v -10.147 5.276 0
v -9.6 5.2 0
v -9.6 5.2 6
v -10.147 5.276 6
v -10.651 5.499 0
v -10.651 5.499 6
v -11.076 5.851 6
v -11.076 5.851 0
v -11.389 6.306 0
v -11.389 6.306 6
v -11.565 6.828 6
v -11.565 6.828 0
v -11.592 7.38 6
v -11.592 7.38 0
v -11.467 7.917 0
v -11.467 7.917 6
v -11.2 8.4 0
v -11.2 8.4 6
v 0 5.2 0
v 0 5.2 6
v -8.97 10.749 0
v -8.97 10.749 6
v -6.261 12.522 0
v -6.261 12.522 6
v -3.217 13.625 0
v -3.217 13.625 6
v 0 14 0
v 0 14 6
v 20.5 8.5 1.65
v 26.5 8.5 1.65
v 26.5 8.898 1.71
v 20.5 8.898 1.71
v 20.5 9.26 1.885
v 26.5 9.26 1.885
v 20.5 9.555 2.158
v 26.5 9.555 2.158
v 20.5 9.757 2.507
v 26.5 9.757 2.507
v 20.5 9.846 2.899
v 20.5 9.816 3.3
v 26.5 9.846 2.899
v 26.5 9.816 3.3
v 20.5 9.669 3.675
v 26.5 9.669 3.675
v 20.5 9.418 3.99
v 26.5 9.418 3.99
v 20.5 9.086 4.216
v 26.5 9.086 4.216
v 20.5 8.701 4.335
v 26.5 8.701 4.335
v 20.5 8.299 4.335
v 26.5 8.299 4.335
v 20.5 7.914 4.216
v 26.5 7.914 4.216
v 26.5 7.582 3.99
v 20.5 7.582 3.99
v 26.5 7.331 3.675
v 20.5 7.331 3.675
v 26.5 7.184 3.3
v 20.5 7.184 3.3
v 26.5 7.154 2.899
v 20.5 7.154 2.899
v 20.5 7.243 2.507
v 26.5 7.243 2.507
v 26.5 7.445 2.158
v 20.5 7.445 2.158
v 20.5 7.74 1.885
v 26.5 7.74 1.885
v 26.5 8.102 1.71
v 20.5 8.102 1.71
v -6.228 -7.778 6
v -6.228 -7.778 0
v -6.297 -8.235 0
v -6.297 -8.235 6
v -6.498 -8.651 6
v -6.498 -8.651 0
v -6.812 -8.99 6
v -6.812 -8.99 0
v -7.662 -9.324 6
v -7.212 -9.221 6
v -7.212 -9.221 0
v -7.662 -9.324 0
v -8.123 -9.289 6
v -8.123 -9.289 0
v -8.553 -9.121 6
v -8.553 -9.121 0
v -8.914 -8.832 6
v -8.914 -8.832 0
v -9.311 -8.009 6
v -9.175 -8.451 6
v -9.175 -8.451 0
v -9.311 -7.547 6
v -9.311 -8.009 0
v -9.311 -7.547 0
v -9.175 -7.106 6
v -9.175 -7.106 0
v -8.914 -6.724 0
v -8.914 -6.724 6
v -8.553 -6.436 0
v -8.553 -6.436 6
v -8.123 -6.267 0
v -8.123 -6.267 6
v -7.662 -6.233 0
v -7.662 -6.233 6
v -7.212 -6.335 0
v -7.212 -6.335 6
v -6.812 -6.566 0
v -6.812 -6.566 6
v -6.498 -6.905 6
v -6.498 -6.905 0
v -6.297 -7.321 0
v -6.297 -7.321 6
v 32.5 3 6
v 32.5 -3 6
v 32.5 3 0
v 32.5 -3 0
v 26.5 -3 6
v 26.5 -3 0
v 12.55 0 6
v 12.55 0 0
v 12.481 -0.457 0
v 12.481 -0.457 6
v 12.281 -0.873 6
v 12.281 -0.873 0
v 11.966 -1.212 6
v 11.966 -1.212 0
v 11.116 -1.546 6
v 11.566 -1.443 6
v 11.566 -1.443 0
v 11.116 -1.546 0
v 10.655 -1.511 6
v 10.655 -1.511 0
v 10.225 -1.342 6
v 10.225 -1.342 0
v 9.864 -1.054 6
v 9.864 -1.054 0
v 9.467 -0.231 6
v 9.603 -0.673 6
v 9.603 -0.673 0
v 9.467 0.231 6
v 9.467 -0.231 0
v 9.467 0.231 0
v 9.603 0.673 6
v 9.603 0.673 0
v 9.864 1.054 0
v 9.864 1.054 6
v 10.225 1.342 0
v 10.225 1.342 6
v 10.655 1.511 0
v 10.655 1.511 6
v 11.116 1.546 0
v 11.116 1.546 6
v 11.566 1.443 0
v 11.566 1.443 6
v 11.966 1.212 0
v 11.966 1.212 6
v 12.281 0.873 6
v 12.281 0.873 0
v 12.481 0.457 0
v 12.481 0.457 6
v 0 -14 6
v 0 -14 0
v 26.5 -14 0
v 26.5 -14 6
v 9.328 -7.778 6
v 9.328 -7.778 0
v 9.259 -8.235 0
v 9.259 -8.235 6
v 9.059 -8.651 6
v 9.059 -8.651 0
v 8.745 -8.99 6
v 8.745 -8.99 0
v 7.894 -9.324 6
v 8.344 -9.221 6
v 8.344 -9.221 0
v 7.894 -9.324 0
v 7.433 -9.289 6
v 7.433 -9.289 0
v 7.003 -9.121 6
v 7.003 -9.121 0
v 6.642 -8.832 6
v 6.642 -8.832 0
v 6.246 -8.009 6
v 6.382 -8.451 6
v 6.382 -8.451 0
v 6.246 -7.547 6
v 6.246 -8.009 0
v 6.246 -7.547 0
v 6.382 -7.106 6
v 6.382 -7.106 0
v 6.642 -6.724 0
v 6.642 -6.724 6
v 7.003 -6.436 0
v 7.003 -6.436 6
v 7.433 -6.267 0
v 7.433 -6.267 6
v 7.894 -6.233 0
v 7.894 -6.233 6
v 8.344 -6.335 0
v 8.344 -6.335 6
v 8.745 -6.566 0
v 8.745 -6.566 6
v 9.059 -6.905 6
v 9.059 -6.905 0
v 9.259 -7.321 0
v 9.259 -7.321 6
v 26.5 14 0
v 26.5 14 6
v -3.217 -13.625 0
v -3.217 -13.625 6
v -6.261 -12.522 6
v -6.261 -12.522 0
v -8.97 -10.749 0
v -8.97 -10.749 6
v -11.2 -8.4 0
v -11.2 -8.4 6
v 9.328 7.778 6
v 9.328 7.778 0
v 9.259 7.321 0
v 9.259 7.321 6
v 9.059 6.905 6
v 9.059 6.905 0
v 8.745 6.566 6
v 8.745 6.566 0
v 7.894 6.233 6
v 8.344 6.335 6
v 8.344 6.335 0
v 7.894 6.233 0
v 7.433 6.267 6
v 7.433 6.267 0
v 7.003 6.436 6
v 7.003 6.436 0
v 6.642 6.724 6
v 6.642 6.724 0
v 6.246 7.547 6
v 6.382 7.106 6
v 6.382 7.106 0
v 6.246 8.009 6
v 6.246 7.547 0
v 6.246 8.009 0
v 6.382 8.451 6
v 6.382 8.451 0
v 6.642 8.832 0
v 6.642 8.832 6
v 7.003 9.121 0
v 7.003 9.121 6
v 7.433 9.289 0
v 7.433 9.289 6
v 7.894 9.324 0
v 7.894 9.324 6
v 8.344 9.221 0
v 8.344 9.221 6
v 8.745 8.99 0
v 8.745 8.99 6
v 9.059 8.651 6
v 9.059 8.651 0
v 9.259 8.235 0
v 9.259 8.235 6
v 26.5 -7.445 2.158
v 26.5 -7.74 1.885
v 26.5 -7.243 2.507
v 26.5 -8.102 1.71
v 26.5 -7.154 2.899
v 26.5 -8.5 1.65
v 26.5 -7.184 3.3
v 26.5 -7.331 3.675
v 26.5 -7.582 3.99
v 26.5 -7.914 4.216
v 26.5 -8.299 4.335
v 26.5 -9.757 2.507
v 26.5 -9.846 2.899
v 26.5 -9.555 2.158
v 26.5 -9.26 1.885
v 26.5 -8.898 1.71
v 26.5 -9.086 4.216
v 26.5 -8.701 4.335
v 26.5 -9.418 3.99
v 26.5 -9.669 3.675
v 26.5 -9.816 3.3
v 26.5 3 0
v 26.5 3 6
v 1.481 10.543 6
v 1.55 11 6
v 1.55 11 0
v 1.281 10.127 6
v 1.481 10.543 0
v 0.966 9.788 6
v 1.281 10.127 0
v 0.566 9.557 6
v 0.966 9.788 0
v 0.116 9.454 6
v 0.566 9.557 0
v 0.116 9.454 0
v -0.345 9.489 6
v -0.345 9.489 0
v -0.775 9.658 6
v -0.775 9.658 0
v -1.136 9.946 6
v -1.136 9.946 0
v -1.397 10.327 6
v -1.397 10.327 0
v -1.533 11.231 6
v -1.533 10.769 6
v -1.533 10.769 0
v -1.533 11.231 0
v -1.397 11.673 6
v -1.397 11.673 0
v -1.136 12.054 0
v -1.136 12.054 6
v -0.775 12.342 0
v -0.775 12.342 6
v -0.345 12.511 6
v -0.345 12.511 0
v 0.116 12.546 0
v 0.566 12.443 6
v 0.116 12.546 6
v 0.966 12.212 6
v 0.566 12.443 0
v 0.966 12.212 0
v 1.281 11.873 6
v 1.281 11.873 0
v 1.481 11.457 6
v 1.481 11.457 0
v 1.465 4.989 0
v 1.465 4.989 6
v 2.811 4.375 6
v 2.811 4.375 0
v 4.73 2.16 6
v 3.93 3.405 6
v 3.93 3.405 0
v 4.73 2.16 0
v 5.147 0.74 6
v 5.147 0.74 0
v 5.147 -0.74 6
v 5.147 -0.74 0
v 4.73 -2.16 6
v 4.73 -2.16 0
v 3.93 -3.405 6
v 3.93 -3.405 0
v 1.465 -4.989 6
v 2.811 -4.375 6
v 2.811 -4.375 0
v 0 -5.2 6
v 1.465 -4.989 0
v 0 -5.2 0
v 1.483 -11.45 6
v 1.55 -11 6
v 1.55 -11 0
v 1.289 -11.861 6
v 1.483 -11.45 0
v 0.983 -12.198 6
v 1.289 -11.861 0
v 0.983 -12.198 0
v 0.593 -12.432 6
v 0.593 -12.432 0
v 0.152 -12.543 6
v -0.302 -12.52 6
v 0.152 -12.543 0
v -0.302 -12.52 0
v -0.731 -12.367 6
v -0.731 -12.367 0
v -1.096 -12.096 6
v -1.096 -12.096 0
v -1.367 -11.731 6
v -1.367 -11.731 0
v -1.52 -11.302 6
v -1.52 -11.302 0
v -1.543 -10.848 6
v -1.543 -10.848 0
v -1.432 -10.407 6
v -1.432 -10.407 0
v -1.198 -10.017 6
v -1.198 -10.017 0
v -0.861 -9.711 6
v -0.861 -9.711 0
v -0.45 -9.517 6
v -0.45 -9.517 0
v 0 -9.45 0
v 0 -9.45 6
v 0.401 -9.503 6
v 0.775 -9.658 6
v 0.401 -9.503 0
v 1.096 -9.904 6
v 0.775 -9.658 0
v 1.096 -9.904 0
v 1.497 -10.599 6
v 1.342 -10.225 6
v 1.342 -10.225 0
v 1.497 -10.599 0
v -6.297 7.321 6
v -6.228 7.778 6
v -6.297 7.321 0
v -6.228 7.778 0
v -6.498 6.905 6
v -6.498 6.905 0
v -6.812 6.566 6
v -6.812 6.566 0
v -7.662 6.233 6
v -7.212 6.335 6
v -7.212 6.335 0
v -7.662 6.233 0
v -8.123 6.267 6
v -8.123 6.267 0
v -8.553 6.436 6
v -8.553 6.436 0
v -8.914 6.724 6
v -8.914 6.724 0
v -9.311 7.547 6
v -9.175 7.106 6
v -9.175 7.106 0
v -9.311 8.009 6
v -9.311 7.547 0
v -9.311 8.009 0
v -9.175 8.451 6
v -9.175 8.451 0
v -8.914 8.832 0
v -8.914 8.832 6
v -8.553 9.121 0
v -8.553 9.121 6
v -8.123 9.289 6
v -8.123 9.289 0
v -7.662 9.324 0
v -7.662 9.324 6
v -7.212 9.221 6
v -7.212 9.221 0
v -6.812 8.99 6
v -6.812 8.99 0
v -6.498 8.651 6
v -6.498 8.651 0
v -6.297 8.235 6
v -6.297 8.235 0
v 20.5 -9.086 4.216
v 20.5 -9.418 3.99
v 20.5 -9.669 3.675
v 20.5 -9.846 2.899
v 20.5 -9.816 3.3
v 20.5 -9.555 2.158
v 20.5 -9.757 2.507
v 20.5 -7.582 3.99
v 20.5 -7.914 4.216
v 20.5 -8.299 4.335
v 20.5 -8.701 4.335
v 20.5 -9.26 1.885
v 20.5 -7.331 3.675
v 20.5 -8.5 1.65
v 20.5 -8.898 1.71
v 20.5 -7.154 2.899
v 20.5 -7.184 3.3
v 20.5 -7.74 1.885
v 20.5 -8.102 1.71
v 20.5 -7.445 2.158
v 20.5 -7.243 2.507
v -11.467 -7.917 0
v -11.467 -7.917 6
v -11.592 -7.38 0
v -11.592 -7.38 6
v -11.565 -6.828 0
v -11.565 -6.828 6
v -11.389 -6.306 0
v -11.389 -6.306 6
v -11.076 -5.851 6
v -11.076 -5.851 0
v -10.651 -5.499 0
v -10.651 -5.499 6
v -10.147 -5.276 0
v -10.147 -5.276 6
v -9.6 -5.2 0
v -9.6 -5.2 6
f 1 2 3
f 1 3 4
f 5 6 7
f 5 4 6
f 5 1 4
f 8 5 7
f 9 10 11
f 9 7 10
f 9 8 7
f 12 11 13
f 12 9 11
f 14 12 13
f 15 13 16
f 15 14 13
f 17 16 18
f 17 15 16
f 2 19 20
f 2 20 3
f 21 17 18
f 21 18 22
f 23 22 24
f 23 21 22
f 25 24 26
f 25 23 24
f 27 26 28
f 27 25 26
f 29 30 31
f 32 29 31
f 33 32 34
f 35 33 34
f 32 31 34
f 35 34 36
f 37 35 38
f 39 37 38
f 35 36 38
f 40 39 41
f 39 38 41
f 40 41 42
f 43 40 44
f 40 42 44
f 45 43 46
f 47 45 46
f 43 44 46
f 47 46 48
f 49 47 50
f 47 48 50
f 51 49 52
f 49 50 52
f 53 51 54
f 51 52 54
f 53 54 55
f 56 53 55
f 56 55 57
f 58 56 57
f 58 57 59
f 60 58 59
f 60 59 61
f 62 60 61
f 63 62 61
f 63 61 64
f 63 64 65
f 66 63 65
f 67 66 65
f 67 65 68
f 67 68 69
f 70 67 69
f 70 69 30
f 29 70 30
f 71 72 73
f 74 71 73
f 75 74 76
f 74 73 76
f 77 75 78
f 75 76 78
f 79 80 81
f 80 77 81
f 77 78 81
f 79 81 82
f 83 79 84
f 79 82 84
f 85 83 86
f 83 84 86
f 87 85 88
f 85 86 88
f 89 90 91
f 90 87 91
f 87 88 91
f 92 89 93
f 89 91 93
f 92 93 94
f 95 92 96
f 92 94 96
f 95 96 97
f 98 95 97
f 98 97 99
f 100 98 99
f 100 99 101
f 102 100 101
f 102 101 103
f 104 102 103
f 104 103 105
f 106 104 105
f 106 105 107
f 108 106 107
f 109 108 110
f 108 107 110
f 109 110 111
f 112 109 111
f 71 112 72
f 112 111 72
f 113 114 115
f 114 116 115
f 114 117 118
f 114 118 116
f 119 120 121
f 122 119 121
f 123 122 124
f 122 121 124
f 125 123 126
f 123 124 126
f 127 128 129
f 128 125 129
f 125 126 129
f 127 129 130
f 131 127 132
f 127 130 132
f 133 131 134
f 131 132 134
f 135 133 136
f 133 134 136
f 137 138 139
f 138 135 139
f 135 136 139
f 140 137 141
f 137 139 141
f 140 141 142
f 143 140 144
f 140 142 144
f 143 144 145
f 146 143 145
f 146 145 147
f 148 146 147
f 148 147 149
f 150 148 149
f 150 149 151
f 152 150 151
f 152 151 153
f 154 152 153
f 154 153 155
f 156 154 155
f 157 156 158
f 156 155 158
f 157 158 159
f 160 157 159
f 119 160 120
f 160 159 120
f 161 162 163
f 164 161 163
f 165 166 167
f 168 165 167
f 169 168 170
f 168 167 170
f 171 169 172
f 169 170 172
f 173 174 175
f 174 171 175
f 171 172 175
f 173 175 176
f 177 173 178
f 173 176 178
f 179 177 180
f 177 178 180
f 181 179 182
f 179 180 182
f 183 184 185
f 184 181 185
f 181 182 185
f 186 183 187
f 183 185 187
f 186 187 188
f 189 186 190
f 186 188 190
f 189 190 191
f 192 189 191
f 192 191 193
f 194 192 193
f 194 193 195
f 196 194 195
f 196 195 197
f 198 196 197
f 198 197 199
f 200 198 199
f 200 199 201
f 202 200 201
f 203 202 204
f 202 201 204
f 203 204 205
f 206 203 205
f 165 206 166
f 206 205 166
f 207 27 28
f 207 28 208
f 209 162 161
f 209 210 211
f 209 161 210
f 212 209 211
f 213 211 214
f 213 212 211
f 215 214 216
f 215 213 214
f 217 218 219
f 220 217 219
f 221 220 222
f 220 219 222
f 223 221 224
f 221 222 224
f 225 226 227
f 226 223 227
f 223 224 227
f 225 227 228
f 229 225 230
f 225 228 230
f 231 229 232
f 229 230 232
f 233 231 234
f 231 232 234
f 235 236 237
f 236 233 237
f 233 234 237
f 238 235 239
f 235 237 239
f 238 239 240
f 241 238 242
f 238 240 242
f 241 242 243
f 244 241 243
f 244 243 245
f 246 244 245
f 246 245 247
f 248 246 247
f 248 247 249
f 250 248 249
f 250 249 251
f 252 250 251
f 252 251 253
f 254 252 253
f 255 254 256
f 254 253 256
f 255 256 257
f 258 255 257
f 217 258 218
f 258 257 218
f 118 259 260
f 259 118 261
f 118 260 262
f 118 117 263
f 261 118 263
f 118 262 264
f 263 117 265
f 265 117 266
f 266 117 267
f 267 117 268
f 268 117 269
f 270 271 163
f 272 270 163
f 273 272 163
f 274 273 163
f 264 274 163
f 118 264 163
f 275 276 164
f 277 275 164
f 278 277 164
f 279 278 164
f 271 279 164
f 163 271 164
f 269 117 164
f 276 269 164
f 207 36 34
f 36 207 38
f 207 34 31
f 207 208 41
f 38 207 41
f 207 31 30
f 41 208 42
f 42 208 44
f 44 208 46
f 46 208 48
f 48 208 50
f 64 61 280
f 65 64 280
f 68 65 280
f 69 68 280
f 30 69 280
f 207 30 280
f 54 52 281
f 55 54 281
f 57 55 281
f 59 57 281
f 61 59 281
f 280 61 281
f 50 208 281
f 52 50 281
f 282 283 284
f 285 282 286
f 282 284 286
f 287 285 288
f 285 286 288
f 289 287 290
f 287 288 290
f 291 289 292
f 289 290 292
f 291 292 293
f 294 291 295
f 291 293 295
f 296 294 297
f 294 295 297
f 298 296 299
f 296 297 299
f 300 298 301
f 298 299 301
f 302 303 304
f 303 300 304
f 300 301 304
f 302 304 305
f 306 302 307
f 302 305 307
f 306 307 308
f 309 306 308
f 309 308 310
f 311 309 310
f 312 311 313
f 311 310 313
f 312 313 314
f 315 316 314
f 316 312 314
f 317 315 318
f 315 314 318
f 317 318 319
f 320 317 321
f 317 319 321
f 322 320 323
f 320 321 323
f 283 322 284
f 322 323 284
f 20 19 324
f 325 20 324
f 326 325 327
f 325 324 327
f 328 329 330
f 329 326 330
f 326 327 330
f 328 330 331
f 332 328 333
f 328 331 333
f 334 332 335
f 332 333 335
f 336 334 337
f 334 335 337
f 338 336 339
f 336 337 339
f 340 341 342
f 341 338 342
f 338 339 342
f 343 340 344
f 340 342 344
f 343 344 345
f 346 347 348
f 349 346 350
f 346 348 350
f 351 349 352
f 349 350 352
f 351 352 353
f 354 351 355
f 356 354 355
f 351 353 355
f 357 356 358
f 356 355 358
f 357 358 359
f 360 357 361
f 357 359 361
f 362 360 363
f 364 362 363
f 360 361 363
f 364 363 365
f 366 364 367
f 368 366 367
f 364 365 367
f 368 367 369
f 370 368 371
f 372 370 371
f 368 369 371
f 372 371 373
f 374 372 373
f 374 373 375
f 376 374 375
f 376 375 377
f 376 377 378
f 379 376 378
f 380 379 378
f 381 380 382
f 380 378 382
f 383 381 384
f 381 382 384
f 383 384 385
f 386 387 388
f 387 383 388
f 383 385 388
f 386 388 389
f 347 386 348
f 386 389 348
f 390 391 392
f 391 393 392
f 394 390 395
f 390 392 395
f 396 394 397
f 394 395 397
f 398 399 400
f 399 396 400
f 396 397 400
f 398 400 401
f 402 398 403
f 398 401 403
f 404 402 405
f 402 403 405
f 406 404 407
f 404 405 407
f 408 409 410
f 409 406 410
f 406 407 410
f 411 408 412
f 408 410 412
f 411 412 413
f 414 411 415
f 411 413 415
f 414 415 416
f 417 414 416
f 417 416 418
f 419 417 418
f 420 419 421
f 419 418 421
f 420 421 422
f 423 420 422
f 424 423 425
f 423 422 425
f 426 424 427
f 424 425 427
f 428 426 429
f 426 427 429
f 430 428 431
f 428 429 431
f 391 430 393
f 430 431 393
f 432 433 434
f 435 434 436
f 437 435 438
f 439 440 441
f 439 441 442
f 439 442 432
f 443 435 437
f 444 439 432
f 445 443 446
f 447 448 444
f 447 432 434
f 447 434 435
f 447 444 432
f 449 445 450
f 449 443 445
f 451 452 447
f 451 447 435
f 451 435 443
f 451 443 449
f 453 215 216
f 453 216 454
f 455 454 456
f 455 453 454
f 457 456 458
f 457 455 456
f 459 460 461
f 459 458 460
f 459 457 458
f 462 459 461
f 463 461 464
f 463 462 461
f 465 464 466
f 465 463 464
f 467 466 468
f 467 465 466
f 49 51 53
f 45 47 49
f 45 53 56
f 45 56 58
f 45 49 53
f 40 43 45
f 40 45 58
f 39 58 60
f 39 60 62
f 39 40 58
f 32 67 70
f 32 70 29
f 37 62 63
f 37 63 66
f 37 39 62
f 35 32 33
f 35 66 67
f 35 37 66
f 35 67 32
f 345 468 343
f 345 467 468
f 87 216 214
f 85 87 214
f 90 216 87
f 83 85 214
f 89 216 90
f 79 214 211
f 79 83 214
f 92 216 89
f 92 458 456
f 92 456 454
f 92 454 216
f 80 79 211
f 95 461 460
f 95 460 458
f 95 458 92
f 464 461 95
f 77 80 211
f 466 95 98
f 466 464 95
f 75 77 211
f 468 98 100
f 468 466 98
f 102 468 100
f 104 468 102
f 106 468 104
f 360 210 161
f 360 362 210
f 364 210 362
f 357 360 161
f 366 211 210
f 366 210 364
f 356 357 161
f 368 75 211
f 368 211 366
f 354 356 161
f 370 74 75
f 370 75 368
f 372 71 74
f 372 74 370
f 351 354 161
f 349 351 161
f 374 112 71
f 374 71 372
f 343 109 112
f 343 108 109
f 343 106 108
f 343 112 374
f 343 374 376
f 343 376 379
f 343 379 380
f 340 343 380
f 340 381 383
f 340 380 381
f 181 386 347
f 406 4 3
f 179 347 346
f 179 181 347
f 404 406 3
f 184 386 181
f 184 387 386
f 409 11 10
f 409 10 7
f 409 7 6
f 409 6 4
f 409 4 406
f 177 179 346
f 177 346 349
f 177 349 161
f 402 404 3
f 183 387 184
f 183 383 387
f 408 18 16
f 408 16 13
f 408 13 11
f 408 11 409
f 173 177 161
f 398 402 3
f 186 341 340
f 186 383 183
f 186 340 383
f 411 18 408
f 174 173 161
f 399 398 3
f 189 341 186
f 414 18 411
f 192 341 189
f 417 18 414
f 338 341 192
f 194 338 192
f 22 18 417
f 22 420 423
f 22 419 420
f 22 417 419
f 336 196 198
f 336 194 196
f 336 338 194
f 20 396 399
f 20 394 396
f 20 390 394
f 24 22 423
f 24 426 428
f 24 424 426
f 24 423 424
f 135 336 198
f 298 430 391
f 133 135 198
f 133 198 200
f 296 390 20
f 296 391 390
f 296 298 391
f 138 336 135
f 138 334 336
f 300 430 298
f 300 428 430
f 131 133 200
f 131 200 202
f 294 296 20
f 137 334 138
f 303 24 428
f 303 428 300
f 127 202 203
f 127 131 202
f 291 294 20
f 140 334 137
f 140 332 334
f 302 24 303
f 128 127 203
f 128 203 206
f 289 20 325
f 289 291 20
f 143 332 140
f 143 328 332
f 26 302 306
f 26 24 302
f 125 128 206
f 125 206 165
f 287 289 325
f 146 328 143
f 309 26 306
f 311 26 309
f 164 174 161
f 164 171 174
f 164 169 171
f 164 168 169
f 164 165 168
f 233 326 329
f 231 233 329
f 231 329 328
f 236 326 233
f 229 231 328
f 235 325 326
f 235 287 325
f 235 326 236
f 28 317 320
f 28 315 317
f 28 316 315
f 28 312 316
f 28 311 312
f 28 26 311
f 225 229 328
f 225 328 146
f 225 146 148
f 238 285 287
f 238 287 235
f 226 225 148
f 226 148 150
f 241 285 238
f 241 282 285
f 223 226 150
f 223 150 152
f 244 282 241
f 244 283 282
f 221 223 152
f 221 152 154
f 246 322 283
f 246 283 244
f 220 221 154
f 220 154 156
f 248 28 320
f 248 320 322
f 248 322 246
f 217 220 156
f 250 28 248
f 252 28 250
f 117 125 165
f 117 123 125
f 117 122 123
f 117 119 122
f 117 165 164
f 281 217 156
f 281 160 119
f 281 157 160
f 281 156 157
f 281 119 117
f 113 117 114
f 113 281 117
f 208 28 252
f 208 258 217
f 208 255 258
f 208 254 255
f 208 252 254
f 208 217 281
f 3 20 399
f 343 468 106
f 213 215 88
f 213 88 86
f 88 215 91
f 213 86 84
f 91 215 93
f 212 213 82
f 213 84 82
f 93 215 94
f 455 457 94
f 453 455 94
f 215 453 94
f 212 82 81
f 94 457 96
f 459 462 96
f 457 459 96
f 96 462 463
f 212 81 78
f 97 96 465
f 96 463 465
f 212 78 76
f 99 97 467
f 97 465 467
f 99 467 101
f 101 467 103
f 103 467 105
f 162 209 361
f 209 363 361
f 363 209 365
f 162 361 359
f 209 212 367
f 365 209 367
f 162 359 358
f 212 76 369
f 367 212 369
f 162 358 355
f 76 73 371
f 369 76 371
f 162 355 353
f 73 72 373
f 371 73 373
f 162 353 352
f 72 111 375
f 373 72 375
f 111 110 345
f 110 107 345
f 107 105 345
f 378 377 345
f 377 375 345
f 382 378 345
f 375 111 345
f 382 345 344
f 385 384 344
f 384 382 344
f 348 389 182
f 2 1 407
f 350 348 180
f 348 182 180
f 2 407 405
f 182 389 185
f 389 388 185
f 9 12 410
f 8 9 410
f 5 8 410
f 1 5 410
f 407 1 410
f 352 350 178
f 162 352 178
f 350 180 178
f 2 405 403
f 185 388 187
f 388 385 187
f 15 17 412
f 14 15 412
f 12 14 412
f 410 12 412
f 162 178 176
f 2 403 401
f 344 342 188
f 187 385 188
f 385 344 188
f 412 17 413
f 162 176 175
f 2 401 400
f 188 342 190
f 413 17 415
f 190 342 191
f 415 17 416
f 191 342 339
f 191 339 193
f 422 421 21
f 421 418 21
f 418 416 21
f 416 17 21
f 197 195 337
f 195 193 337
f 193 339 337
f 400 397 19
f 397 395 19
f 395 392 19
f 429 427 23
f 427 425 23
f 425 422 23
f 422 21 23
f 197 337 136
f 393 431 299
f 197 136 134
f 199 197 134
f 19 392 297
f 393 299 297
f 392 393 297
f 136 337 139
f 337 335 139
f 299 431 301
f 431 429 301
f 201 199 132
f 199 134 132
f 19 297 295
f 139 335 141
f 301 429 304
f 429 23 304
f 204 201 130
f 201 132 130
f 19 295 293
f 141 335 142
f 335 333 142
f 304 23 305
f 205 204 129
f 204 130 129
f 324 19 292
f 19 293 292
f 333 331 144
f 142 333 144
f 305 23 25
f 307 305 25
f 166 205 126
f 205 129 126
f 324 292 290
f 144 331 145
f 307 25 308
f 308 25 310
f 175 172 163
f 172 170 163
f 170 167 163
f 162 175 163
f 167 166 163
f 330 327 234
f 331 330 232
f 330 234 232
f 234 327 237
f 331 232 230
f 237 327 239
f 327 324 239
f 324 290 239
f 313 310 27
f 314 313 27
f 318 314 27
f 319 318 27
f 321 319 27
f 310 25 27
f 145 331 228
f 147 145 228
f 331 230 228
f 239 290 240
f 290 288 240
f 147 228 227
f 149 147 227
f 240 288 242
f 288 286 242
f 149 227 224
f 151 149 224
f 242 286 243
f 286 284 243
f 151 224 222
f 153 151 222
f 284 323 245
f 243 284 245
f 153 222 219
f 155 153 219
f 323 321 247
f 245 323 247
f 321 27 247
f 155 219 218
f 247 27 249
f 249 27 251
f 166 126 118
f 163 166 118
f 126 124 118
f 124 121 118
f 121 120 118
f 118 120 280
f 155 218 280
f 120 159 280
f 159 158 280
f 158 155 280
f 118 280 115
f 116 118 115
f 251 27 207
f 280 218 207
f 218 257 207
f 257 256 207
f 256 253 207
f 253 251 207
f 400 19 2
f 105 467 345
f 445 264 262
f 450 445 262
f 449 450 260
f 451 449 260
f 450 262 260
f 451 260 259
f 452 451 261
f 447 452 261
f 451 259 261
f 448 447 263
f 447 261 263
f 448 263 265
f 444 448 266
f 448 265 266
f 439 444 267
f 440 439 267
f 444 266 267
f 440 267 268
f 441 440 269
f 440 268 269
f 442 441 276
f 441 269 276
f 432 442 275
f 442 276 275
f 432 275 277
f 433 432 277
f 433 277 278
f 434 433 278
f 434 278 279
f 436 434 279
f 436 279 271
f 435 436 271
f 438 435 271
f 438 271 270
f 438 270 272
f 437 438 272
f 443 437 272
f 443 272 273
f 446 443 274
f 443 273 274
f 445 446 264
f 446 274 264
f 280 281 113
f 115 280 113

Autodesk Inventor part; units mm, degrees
ref_plane "YZ Plane" through (0, 0, 0) normal (1, 0, 0) x (0, 1, 0)
ref_plane "XZ Plane" through (0, 0, 0) normal (0, 1, 0) x (-1, 0, 0)
ref_plane "XY Plane" through (0, 0, 0) normal (0, 0, 1) x (1, 0, 0)
sketch "스케치1" plane through (0, 0, 0) normal (0, 0, 1) x (1, 0, 0)
  circle A0 centre (-7.7782, -7.7782) radius 1.55 projected
  circle A1 centre (7.7782, -7.7782) radius 1.55 projected
  circle A2 centre (7.7782, 7.7782) radius 1.55 projected
  circle A3 centre (-7.7782, 7.7782) radius 1.55 projected
  circle A4 centre (0, 11) radius 1.55 projected
  circle A5 centre (11, 0) radius 1.55 projected
  circle A6 centre (0, -11) radius 1.55 projected
  circle A7 centre (-11, 0) radius 1.55 projected
  circle A8 centre (0, 0) radius 14 projected
  arc A9 (0, -5.2) -> (0, 5.2) centre (0, 0) ccw
  line L0 (32.5, -23) -> (32.5001, 127) projected
  line L1 (26.5, -23) -> (32.5, -23) projected
  line L2 (26.5001, 127) -> (26.5, -23) projected
  line L3 (32.5001, 127) -> (26.5001, 127) projected
  line L4 (0, 14) -> (32.5, 14)
  line L5 (32.5, 14) -> (32.5, -12.55)
  line L6 (0, -12.55) -> (0, 14)
  line L7 (0, -14) -> (32.5, -14)
  line L8 (32.5, -14) -> (32.5, -12.55)
  line L9 (0, 5.2) -> (-9.6, 5.2)
  line L10 (-9.6, -5.2) -> (0, -5.2)
  line L11 (0, -5.2) -> (0, 5.2)
  arc A10 (-11.2, -8.4) -> (-11.2, 8.4) centre (0, 0) ccw
  arc A11 (-11.2, 8.4) -> (-9.6, 5.2) centre (-9.6, 7.2) ccw
  arc A12 (-9.6, -5.2) -> (-11.2, -8.4) centre (-9.6, -7.2) ccw
  line L12 (26.5, 0) -> (32.5, 0)
  line L13 (32.5, 0) -> (32.5, -3)
  line L14 (32.5, -3) -> (26.5, -3)
  line L15 (26.5, -3) -> (26.5, 0)
  line L16 (32.5, 0) -> (26.5, 0)
  line L17 (26.5, 0) -> (26.5, 3)
  line L18 (26.5, 3) -> (32.5, 3)
  line L19 (32.5, 3) -> (32.5, 0)
  point P0 (0, 0)
  point P1 (-12.9985, -5.2)
  point P2 (-12.9985, 5.2)
  point P3 (-11.2, 8.4)
  dimension "d1" = 2
  dimension "d4" = 3
  dimension "d5" = 3
extrude "돌출1" add sketch "스케치1" along normal blind 6 contours A4 L6 A8 A12 L10 A9 | A4 L6 L9 A11 A8 | L4 L2 L7 A8 | L4 L0 L18 L2 | L18 L0 L12 L2 | L2 L14 L0 L7 | L12 L0 L14 L2
sketch "스케치2" plane through (0, 0, 6) normal (0, 0, 1) x (1, 0, 0)
  arc A0 (-9.6, -5.2) -> (-11.2, -8.4) centre (-9.6, -7.2) ccw projected
  arc A1 (-11.2, -8.4) -> (0, -14) centre (0, 0) ccw projected
  line L0 (0, -14) -> (32.5, -14) projected
  line L1 (32.5, -14) -> (32.5, 14) projected
  line L2 (32.5, 14) -> (0, 14) projected
  arc A2 (0, 14) -> (-11.2, 8.4) centre (0, 0) ccw projected
  arc A3 (-11.2, 8.4) -> (-9.6, 5.2) centre (-9.6, 7.2) ccw projected
  line L3 (-9.6, 5.2) -> (0, 5.2) projected
  arc A4 (0, -5.2) -> (0, 5.2) centre (0, 0) ccw projected
  line L4 (0, -5.2) -> (-9.6, -5.2) projected
  circle A5 centre (0, -11) radius 1.55 projected
  circle A6 centre (-7.7782, 7.7782) radius 1.55 projected
  circle A7 centre (-7.7782, -7.7782) radius 1.55 projected
  circle A8 centre (7.7782, -7.7782) radius 1.55 projected
  circle A9 centre (7.7782, 7.7782) radius 1.55 projected
  circle A10 centre (11, 0) radius 1.55 projected
  circle A11 centre (0, 11) radius 1.55 projected
  line L5 (32.5, 14) -> (26.5, 14)
  line L6 (26.5, 14) -> (26.5, -14)
  line L7 (26.5, -14) -> (32.5, -14)
  line L8 (32.5, -14) -> (32.5, 14)
  line L9 (32.5, -14) -> (32.5, 14) projected
  line L10 (32.5, 0) -> (26.5, 0)
  line L11 (26.5, 0) -> (26.5, -3)
  line L12 (26.5, -3) -> (32.5, -3)
  line L13 (32.5, -3) -> (32.5, 0)
  line L14 (32.5, 0) -> (26.5, 0)
  line L15 (26.5, 0) -> (26.5, 3)
  line L16 (26.5, 3) -> (32.5, 3)
  line L17 (32.5, 3) -> (32.5, 0)
  point P0 (0, 0)
  point P1 (32.5, -3)
  dimension "d6" = 6
  dimension "d7" = 3
  dimension "d8" = 3
extrude "돌출2" cut sketch "스케치2" against normal blind 6 contours L6 L12 L1 L0 | L6 L2 L1 L16
sketch "스케치3" plane through (32.5, 52, -3.7) normal (1, 0, 0) x (0, -1, 0)
  point P0 (52, -3.7)
sketch "스케치4" plane through (26.5, -14, 6) normal (1, 0, 0) x (0, 0, -1)
  circle A0 centre (3, 5.5) radius 1.35 projected
  circle A1 centre (3, 22.5) radius 1.35 projected
  circle A2 centre (66.3, 80.5) radius 1.3 projected
  circle A3 centre (66.3, 51.5) radius 1.3 projected
  circle A4 centre (66.3, 118) radius 1.35 projected
  circle A5 centre (66.3, 14) radius 1.35 projected
  arc A6 (62.1, 141) -> (63.1, 140) centre (63.1, 141) ccw projected
  line L0 (62.1, 141) -> (-10.1, 141) projected
  line L1 (-10.1, 141) -> (-10.1, -9) projected
  line L2 (-10.1, -9) -> (62.1, -9) projected
  arc A7 (63.1, -8) -> (62.1, -9) centre (63.1, -9) ccw projected
  line L3 (63.1, -8) -> (63.1, -3.8) projected
  arc A8 (64.1, -2.8) -> (63.1, -3.8) centre (63.1, -2.8) ccw projected
  line L4 (64.1, -2.8) -> (68.3, -2.8) projected
  arc A9 (69.3, -1.8) -> (68.3, -2.8) centre (69.3, -2.8) ccw projected
  line L5 (69.3, -1.8) -> (69.3, 29.8) projected
  arc A10 (68.3, 30.8) -> (69.3, 29.8) centre (69.3, 30.8) ccw projected
  line L6 (68.3, 30.8) -> (64.1, 30.8) projected
  arc A11 (63.1, 31.8) -> (64.1, 30.8) centre (63.1, 30.8) ccw projected
  line L7 (63.1, 31.8) -> (63.1, 36.2) projected
  arc A12 (64.1, 37.2) -> (63.1, 36.2) centre (63.1, 37.2) ccw projected
  line L8 (64.1, 37.2) -> (68.3, 37.2) projected
  arc A13 (69.3, 38.2) -> (68.3, 37.2) centre (69.3, 37.2) ccw projected
  line L9 (69.3, 38.2) -> (69.3, 93.8) projected
  arc A14 (68.3, 94.8) -> (69.3, 93.8) centre (69.3, 94.8) ccw projected
  line L10 (68.3, 94.8) -> (64.1, 94.8) projected
  arc A15 (63.1, 95.8) -> (64.1, 94.8) centre (63.1, 94.8) ccw projected
  line L11 (63.1, 95.8) -> (63.1, 100.2) projected
  arc A16 (64.1, 101.2) -> (63.1, 100.2) centre (63.1, 101.2) ccw projected
  line L12 (64.1, 101.2) -> (68.3, 101.2) projected
  arc A17 (69.3, 102.2) -> (68.3, 101.2) centre (69.3, 101.2) ccw projected
  line L13 (69.3, 102.2) -> (69.3, 133.8) projected
  arc A18 (68.3, 134.8) -> (69.3, 133.8) centre (69.3, 134.8) ccw projected
  line L14 (68.3, 134.8) -> (64.1, 134.8) projected
  arc A19 (63.1, 135.8) -> (64.1, 134.8) centre (63.1, 134.8) ccw projected
  line L15 (63.1, 135.8) -> (63.1, 140) projected
  arc A20 (0.8, 121.2) -> (-0.2, 120.2) centre (-0.2, 121.2) ccw projected
  line L16 (0.8, 121.2) -> (5.2, 121.2) projected
  arc A21 (6.2, 120.2) -> (5.2, 121.2) centre (6.2, 121.2) ccw projected
  line L17 (6.2, 120.2) -> (6.2, 115.8) projected
  arc A22 (5.2, 114.8) -> (6.2, 115.8) centre (6.2, 114.8) ccw projected
  line L18 (5.2, 114.8) -> (0.8, 114.8) projected
  arc A23 (-0.2, 115.8) -> (0.8, 114.8) centre (-0.2, 114.8) ccw projected
  line L19 (-0.2, 115.8) -> (-0.2, 120.2) projected
  arc A24 (0.8, 17.2) -> (-0.2, 16.2) centre (-0.2, 17.2) ccw projected
  line L20 (0.8, 17.2) -> (5.2, 17.2) projected
  arc A25 (6.2, 16.2) -> (5.2, 17.2) centre (6.2, 17.2) ccw projected
  line L21 (6.2, 16.2) -> (6.2, 11.8) projected
  arc A26 (5.2, 10.8) -> (6.2, 11.8) centre (6.2, 10.8) ccw projected
  line L22 (5.2, 10.8) -> (0.8, 10.8) projected
  arc A27 (-0.2, 11.8) -> (0.8, 10.8) centre (-0.2, 10.8) ccw projected
  line L23 (-0.2, 11.8) -> (-0.2, 16.2) projected
  circle A28 centre (29.5, 66) radius 1.6 projected
  point P0 (6, 14)
extrude "돌출3" cut sketch "스케치4" against normal blind 6 contours A0 | A1
properties part number "부품69" material "PMMA 플라스틱"
